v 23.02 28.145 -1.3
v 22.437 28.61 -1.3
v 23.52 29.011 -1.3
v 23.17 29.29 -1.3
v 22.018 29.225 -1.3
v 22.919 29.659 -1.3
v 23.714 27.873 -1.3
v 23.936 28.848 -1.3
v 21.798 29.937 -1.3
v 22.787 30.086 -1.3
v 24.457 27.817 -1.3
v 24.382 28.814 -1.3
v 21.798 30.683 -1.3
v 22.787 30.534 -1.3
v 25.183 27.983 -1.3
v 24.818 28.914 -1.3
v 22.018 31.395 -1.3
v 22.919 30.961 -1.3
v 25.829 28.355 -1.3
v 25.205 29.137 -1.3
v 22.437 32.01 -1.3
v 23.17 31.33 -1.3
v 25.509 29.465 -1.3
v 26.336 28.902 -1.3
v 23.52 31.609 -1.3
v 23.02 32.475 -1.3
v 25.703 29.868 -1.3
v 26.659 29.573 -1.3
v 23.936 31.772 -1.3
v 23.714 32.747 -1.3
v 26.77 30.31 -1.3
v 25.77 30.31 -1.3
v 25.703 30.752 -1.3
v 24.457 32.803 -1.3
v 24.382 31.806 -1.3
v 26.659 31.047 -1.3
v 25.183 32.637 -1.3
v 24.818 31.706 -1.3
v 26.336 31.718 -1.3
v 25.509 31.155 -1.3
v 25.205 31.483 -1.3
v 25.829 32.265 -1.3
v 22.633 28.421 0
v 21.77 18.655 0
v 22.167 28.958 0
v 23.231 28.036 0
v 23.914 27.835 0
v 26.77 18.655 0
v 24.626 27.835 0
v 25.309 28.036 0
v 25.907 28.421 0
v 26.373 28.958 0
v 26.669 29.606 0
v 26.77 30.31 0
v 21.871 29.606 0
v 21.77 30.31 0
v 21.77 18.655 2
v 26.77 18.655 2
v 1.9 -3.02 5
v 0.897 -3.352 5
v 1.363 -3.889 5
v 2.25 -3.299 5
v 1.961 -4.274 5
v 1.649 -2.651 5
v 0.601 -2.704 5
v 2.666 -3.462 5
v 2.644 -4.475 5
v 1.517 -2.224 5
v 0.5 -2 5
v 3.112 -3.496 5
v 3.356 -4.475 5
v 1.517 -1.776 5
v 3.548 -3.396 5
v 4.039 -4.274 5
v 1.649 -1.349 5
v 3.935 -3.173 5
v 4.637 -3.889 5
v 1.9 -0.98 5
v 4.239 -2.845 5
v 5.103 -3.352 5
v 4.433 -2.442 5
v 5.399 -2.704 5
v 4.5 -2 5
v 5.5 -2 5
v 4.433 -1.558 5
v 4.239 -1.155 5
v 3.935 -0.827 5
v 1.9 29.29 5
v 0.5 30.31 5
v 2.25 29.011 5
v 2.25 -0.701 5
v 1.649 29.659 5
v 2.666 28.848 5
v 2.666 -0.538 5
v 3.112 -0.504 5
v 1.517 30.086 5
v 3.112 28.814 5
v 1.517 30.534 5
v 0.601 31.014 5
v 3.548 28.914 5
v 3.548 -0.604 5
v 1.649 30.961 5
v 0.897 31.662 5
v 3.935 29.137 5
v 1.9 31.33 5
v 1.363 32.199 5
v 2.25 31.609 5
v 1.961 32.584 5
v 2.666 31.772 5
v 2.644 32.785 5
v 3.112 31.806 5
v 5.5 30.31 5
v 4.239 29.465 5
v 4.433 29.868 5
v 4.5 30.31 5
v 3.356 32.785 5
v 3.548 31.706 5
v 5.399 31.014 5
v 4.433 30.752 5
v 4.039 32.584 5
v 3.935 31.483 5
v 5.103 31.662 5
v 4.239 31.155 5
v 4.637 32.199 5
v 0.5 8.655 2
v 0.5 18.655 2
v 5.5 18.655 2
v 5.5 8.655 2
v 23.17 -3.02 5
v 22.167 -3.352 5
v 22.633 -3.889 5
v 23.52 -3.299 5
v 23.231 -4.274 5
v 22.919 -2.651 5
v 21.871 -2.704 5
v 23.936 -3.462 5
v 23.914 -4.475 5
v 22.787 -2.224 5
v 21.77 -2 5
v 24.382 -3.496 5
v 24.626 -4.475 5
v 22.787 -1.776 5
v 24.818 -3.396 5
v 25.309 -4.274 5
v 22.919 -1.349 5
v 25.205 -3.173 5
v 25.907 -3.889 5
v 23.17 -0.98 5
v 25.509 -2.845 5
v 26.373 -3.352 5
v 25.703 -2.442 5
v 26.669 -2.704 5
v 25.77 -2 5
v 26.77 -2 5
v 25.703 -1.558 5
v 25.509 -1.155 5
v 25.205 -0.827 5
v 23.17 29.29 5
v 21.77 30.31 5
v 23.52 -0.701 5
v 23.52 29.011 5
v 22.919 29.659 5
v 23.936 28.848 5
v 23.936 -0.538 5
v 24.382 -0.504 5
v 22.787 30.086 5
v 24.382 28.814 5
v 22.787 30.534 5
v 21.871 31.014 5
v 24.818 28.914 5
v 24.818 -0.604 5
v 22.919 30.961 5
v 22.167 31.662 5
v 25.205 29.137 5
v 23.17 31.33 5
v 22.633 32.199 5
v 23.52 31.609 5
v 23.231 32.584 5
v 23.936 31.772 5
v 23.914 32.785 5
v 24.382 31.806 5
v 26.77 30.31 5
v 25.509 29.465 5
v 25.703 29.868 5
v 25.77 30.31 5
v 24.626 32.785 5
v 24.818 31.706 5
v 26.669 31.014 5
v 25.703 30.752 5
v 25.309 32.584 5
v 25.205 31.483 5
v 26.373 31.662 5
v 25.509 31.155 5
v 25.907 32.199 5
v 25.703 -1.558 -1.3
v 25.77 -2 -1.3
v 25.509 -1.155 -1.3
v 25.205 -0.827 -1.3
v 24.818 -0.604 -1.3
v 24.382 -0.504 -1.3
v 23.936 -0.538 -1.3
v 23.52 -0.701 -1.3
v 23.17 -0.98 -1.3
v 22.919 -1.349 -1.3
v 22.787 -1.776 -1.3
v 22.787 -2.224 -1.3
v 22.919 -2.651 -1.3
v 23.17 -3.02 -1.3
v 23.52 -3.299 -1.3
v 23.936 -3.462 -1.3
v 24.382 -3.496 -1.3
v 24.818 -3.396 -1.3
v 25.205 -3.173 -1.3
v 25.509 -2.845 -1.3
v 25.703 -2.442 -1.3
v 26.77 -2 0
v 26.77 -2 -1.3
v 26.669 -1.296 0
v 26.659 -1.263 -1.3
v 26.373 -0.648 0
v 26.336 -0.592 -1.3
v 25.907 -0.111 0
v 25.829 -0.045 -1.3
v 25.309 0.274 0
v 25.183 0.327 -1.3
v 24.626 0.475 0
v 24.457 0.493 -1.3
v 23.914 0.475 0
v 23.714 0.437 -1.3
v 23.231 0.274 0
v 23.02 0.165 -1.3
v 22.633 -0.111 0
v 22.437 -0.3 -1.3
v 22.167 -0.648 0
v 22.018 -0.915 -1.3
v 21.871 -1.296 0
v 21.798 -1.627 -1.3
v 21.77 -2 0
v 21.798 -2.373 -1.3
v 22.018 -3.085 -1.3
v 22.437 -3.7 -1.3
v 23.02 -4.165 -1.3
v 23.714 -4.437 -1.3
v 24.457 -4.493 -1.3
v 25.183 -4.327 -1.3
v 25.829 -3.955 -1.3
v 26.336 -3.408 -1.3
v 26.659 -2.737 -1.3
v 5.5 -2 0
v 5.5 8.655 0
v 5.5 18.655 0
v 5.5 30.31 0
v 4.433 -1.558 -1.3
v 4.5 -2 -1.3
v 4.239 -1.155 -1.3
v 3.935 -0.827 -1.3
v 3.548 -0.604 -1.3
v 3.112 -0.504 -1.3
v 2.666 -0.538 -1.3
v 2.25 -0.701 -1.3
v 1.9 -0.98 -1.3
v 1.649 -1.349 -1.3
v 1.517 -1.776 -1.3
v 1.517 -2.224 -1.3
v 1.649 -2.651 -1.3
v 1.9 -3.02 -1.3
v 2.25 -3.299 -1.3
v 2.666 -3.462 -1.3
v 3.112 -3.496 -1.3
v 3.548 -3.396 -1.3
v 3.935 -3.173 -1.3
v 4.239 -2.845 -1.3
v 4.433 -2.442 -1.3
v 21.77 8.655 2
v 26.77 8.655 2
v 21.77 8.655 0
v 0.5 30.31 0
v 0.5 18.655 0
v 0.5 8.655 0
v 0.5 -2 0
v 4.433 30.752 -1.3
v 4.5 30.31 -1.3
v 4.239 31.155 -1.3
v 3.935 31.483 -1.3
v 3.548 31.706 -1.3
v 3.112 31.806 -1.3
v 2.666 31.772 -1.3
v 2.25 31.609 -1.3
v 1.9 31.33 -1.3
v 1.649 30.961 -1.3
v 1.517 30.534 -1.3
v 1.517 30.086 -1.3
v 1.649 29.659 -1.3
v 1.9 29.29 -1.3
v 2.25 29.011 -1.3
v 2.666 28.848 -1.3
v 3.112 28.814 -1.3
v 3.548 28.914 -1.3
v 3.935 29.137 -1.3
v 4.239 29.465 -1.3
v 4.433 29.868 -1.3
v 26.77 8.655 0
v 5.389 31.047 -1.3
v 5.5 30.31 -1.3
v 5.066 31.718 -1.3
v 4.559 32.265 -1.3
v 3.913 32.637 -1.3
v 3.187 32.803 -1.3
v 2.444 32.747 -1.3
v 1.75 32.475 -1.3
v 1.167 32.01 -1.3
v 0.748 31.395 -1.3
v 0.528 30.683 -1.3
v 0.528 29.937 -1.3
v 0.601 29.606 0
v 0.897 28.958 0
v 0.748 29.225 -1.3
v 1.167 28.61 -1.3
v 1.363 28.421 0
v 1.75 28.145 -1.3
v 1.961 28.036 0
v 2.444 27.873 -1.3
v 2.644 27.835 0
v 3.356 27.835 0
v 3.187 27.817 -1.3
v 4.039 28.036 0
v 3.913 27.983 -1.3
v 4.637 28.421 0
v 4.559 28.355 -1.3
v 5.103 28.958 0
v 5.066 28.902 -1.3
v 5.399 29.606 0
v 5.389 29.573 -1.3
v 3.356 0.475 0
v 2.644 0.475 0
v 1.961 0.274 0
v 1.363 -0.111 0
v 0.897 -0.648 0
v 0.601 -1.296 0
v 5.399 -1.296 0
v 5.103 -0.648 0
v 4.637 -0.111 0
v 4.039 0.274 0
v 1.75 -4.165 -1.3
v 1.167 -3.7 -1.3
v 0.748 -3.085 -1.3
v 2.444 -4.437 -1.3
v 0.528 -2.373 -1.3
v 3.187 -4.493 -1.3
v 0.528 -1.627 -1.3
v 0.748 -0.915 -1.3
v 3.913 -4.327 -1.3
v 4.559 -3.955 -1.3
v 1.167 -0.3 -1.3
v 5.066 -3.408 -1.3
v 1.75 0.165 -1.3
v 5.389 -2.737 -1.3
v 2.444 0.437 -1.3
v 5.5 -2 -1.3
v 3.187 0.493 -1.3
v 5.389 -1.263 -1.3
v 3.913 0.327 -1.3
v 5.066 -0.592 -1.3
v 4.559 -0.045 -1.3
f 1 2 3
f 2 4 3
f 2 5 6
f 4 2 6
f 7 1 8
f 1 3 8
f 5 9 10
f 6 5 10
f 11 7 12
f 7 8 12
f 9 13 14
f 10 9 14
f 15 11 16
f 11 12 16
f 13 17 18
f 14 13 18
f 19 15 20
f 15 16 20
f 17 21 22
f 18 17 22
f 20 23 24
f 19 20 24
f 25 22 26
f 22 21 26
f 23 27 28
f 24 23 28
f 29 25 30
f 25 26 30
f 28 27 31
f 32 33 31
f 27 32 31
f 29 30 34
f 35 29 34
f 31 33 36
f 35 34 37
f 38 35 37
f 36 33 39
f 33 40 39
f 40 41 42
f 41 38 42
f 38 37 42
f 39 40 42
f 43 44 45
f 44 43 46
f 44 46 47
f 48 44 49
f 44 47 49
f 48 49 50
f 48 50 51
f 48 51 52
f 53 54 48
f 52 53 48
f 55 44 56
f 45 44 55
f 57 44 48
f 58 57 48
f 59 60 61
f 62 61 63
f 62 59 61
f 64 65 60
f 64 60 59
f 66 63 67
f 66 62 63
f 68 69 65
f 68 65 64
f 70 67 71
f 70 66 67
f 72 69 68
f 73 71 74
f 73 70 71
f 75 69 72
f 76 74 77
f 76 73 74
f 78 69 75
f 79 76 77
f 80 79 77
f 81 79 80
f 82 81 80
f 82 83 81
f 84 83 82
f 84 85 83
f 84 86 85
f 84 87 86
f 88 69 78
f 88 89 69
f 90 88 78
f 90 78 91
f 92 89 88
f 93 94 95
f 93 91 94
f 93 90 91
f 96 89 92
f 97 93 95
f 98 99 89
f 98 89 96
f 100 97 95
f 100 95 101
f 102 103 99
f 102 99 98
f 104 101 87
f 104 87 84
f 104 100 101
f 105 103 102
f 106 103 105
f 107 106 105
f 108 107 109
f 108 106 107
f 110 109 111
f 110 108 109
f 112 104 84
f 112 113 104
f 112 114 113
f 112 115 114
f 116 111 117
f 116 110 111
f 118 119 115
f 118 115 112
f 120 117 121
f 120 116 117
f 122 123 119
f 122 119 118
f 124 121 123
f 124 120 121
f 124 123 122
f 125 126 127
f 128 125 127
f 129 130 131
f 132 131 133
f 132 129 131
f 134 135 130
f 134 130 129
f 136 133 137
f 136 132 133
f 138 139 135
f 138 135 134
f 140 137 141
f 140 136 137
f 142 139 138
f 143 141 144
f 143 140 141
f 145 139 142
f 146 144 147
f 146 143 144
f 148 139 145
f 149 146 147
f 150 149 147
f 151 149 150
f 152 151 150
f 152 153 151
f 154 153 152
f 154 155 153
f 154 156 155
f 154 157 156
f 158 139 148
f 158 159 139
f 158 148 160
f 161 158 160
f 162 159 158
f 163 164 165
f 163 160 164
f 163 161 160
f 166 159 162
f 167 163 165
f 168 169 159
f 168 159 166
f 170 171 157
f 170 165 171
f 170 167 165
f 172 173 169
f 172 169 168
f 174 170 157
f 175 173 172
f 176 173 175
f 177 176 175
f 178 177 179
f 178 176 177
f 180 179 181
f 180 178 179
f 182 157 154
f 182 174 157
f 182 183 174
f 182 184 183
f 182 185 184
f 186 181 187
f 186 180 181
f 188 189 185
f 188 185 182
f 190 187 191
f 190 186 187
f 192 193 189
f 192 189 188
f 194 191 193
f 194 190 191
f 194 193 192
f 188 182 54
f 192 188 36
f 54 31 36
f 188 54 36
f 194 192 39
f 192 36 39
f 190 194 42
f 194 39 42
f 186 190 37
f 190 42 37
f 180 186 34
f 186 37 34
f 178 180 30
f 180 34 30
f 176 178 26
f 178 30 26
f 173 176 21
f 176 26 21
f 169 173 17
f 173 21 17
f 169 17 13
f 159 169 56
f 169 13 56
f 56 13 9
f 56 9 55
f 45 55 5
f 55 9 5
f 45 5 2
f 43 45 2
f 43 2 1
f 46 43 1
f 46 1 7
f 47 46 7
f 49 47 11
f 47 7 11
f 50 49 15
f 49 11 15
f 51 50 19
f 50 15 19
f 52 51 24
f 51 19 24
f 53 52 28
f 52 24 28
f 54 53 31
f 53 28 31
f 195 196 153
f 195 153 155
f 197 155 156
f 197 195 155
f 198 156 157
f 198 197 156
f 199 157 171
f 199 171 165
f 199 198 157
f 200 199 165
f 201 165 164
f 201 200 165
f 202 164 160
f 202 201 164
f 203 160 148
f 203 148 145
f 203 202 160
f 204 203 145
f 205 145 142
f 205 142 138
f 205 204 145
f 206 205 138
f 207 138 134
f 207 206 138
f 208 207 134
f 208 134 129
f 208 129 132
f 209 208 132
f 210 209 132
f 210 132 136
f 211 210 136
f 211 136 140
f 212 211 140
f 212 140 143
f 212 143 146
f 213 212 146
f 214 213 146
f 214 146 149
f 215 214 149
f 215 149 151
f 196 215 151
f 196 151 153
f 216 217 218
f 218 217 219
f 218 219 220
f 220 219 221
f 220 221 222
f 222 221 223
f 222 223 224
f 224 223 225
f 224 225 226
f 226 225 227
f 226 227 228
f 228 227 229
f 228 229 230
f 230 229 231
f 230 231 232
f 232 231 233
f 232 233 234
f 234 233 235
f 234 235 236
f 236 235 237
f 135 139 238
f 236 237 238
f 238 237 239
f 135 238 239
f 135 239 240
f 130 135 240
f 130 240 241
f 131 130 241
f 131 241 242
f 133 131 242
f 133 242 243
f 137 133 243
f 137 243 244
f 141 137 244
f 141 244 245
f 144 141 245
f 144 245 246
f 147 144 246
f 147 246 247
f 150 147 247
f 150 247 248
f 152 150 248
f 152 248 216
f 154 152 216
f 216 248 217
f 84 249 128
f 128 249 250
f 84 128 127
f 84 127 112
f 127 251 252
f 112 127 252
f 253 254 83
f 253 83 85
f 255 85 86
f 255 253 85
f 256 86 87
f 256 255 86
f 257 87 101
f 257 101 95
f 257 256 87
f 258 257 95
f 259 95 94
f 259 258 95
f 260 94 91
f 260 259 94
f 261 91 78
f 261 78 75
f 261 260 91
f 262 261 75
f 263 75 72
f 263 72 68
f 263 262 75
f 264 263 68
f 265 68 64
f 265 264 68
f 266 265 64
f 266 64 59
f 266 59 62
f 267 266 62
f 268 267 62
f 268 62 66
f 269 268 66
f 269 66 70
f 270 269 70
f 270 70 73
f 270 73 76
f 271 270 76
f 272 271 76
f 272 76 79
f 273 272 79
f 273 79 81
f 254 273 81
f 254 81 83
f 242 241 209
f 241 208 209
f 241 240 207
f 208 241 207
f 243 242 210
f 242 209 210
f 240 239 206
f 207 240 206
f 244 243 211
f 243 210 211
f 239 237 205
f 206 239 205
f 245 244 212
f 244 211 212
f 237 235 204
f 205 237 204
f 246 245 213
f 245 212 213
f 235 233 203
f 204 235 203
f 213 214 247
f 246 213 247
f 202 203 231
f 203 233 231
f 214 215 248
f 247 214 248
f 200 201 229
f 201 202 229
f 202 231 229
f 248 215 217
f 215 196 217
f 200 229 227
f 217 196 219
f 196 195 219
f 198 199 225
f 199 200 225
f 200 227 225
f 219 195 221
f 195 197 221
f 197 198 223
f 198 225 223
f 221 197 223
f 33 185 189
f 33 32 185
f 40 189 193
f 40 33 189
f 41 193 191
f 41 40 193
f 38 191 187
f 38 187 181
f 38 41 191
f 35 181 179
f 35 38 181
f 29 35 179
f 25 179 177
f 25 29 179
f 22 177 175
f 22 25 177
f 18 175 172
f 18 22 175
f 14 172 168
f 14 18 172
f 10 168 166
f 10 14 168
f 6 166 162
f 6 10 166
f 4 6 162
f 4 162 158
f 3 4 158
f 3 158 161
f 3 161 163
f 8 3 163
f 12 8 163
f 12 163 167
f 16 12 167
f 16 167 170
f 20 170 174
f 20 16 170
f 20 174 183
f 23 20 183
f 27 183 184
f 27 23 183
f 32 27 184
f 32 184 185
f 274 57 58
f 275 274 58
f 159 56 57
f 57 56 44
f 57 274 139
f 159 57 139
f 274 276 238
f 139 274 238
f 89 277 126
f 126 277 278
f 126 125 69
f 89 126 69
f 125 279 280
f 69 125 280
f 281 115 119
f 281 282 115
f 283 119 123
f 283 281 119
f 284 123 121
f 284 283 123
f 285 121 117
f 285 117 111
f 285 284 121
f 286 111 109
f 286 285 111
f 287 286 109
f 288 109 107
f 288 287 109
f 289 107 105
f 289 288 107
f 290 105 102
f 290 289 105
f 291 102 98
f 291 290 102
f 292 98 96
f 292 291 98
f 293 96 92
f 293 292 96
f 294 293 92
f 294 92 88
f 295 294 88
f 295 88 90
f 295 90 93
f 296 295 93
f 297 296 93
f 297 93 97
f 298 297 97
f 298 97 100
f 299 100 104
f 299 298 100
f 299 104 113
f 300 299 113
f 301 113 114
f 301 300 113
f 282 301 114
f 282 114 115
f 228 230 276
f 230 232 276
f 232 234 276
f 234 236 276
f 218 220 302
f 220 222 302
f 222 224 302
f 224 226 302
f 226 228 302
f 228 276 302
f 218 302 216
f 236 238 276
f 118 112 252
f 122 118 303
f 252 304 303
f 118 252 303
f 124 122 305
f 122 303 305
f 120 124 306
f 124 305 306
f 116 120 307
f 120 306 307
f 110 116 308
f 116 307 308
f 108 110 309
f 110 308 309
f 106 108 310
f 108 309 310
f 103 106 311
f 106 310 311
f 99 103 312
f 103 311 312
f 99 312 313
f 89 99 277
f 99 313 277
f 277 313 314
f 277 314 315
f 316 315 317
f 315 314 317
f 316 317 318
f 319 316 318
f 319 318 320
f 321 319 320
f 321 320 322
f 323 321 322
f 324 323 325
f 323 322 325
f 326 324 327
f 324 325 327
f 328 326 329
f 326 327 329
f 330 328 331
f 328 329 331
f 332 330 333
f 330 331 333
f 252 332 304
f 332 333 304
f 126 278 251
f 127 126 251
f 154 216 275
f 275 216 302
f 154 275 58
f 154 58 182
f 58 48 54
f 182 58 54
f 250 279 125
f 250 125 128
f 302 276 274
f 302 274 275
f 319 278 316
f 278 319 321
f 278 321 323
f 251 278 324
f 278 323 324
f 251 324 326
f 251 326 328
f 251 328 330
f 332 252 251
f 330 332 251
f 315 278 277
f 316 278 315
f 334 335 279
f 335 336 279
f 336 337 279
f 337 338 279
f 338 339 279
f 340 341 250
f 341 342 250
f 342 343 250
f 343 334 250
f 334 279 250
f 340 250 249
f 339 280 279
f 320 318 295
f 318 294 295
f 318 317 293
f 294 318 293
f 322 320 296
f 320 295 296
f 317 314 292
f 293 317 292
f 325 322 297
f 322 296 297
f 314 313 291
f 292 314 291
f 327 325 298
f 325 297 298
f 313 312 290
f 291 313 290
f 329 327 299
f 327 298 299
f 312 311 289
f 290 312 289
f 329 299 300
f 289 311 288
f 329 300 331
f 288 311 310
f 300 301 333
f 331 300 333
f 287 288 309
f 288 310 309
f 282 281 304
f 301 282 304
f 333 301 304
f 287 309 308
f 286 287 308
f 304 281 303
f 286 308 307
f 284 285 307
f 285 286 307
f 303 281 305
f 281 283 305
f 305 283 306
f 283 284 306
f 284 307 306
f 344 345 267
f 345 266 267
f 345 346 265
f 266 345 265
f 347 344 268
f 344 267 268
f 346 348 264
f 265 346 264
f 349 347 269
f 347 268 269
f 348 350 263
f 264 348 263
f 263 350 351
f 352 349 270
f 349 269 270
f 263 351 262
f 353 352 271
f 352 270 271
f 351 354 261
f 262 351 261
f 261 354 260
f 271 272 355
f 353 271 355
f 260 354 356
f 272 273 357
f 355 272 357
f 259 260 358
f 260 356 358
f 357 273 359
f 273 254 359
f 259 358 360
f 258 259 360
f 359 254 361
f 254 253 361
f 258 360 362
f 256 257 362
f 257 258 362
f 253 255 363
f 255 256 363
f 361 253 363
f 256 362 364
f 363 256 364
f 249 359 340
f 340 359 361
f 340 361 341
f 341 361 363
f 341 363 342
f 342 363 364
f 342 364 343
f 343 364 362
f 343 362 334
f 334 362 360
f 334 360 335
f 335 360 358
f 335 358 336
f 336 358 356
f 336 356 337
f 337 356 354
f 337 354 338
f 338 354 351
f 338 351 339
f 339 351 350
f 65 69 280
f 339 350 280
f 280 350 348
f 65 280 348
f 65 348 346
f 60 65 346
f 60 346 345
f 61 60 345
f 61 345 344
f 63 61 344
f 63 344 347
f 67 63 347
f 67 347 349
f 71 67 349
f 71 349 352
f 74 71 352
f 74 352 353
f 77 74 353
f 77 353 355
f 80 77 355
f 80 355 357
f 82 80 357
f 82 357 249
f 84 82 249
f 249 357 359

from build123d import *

# Parameters (mm, degrees)
SKETCH045_R      = 2.5
SKETCH045_R_2    = 1.5
EXTRUDE046_DEPTH = 1.3
SKETCH035_W      = 27.27
SKETCH035_H      = 10
EXTRUDE033_DEPTH = 2
SKETCH034_R      = 1.5
EXTRUDE034_DEPTH = 5


with BuildPart() as extrude_displaycase_mount_stand:
    # Sketch045 → Extrude046 (new body)
    with BuildSketch(Plane.XY):
        with Locations((3, 30.31)):
            Circle(SKETCH045_R)
        with Locations((3, 30.31)):
            Circle(SKETCH045_R_2, mode=Mode.SUBTRACT)
        with Locations((24.27, 30.31)):
            Circle(SKETCH045_R)
        with Locations((24.27, 30.31)):
            Circle(SKETCH045_R_2, mode=Mode.SUBTRACT)
        with Locations((3, -2)):
            Circle(SKETCH045_R)
        with Locations((3, -2)):
            Circle(SKETCH045_R_2, mode=Mode.SUBTRACT)
        with Locations((24.27, -2)):
            Circle(SKETCH045_R)
        with Locations((24.27, -2)):
            Circle(SKETCH045_R_2, mode=Mode.SUBTRACT)
    extrude(amount=EXTRUDE046_DEPTH)


with BuildPart() as extrude_displaycase_mount_stand_1:
    # Extrude046 placement: moved
    add(extrude_displaycase_mount_stand.part.moved(Location((0, 0, -1.3))))


with BuildPart() as extrude_displaycase_mountcutout:
    # Sketch035 → Extrude033 (new body)
    with BuildSketch(Plane.XY):
        with Locations((13.635, 13.655)):
            Rectangle(SKETCH035_W, SKETCH035_H)
    extrude(amount=EXTRUDE033_DEPTH)


with BuildPart() as fusion_displaycase_mount:
    # Sketch034 → Extrude034 (new body)
    with BuildSketch(Plane.XY):
        with BuildLine():
            ThreePointArc((5.5, 30.31), (3, 32.81), (0.5, 30.31))
            Line((0.5, 30.31), (0.5, -2))
            ThreePointArc((0.5, -2), (3, -4.5), (5.5, -2))
            Line((5.5, -2), (5.5, 30.31))
        make_face()
        with Locations((3, 30.31)):
            Circle(SKETCH034_R, mode=Mode.SUBTRACT)
        with Locations((3, -2)):
            Circle(SKETCH034_R, mode=Mode.SUBTRACT)
        with BuildLine():
            ThreePointArc((26.77, 30.31), (24.27, 32.81), (21.77, 30.31))
            Line((21.77, 30.31), (21.77, -2))
            ThreePointArc((21.77, -2), (24.27, -4.5), (26.77, -2))
            Line((26.77, -2), (26.77, 30.31))
        make_face()
        with Locations((24.27, 30.31)):
            Circle(SKETCH034_R, mode=Mode.SUBTRACT)
        with Locations((24.27, -2)):
            Circle(SKETCH034_R, mode=Mode.SUBTRACT)
    extrude(amount=EXTRUDE034_DEPTH)

    # Cut008: cut Extrude_DisplayCase_MountCutOut
    add(extrude_displaycase_mountcutout.part, mode=Mode.SUBTRACT)

    # Fusion014: union Extrude_DisplayCase_Mount_Stand
    add(extrude_displaycase_mount_stand_1.part)


solid = fusion_displaycase_mount.part
